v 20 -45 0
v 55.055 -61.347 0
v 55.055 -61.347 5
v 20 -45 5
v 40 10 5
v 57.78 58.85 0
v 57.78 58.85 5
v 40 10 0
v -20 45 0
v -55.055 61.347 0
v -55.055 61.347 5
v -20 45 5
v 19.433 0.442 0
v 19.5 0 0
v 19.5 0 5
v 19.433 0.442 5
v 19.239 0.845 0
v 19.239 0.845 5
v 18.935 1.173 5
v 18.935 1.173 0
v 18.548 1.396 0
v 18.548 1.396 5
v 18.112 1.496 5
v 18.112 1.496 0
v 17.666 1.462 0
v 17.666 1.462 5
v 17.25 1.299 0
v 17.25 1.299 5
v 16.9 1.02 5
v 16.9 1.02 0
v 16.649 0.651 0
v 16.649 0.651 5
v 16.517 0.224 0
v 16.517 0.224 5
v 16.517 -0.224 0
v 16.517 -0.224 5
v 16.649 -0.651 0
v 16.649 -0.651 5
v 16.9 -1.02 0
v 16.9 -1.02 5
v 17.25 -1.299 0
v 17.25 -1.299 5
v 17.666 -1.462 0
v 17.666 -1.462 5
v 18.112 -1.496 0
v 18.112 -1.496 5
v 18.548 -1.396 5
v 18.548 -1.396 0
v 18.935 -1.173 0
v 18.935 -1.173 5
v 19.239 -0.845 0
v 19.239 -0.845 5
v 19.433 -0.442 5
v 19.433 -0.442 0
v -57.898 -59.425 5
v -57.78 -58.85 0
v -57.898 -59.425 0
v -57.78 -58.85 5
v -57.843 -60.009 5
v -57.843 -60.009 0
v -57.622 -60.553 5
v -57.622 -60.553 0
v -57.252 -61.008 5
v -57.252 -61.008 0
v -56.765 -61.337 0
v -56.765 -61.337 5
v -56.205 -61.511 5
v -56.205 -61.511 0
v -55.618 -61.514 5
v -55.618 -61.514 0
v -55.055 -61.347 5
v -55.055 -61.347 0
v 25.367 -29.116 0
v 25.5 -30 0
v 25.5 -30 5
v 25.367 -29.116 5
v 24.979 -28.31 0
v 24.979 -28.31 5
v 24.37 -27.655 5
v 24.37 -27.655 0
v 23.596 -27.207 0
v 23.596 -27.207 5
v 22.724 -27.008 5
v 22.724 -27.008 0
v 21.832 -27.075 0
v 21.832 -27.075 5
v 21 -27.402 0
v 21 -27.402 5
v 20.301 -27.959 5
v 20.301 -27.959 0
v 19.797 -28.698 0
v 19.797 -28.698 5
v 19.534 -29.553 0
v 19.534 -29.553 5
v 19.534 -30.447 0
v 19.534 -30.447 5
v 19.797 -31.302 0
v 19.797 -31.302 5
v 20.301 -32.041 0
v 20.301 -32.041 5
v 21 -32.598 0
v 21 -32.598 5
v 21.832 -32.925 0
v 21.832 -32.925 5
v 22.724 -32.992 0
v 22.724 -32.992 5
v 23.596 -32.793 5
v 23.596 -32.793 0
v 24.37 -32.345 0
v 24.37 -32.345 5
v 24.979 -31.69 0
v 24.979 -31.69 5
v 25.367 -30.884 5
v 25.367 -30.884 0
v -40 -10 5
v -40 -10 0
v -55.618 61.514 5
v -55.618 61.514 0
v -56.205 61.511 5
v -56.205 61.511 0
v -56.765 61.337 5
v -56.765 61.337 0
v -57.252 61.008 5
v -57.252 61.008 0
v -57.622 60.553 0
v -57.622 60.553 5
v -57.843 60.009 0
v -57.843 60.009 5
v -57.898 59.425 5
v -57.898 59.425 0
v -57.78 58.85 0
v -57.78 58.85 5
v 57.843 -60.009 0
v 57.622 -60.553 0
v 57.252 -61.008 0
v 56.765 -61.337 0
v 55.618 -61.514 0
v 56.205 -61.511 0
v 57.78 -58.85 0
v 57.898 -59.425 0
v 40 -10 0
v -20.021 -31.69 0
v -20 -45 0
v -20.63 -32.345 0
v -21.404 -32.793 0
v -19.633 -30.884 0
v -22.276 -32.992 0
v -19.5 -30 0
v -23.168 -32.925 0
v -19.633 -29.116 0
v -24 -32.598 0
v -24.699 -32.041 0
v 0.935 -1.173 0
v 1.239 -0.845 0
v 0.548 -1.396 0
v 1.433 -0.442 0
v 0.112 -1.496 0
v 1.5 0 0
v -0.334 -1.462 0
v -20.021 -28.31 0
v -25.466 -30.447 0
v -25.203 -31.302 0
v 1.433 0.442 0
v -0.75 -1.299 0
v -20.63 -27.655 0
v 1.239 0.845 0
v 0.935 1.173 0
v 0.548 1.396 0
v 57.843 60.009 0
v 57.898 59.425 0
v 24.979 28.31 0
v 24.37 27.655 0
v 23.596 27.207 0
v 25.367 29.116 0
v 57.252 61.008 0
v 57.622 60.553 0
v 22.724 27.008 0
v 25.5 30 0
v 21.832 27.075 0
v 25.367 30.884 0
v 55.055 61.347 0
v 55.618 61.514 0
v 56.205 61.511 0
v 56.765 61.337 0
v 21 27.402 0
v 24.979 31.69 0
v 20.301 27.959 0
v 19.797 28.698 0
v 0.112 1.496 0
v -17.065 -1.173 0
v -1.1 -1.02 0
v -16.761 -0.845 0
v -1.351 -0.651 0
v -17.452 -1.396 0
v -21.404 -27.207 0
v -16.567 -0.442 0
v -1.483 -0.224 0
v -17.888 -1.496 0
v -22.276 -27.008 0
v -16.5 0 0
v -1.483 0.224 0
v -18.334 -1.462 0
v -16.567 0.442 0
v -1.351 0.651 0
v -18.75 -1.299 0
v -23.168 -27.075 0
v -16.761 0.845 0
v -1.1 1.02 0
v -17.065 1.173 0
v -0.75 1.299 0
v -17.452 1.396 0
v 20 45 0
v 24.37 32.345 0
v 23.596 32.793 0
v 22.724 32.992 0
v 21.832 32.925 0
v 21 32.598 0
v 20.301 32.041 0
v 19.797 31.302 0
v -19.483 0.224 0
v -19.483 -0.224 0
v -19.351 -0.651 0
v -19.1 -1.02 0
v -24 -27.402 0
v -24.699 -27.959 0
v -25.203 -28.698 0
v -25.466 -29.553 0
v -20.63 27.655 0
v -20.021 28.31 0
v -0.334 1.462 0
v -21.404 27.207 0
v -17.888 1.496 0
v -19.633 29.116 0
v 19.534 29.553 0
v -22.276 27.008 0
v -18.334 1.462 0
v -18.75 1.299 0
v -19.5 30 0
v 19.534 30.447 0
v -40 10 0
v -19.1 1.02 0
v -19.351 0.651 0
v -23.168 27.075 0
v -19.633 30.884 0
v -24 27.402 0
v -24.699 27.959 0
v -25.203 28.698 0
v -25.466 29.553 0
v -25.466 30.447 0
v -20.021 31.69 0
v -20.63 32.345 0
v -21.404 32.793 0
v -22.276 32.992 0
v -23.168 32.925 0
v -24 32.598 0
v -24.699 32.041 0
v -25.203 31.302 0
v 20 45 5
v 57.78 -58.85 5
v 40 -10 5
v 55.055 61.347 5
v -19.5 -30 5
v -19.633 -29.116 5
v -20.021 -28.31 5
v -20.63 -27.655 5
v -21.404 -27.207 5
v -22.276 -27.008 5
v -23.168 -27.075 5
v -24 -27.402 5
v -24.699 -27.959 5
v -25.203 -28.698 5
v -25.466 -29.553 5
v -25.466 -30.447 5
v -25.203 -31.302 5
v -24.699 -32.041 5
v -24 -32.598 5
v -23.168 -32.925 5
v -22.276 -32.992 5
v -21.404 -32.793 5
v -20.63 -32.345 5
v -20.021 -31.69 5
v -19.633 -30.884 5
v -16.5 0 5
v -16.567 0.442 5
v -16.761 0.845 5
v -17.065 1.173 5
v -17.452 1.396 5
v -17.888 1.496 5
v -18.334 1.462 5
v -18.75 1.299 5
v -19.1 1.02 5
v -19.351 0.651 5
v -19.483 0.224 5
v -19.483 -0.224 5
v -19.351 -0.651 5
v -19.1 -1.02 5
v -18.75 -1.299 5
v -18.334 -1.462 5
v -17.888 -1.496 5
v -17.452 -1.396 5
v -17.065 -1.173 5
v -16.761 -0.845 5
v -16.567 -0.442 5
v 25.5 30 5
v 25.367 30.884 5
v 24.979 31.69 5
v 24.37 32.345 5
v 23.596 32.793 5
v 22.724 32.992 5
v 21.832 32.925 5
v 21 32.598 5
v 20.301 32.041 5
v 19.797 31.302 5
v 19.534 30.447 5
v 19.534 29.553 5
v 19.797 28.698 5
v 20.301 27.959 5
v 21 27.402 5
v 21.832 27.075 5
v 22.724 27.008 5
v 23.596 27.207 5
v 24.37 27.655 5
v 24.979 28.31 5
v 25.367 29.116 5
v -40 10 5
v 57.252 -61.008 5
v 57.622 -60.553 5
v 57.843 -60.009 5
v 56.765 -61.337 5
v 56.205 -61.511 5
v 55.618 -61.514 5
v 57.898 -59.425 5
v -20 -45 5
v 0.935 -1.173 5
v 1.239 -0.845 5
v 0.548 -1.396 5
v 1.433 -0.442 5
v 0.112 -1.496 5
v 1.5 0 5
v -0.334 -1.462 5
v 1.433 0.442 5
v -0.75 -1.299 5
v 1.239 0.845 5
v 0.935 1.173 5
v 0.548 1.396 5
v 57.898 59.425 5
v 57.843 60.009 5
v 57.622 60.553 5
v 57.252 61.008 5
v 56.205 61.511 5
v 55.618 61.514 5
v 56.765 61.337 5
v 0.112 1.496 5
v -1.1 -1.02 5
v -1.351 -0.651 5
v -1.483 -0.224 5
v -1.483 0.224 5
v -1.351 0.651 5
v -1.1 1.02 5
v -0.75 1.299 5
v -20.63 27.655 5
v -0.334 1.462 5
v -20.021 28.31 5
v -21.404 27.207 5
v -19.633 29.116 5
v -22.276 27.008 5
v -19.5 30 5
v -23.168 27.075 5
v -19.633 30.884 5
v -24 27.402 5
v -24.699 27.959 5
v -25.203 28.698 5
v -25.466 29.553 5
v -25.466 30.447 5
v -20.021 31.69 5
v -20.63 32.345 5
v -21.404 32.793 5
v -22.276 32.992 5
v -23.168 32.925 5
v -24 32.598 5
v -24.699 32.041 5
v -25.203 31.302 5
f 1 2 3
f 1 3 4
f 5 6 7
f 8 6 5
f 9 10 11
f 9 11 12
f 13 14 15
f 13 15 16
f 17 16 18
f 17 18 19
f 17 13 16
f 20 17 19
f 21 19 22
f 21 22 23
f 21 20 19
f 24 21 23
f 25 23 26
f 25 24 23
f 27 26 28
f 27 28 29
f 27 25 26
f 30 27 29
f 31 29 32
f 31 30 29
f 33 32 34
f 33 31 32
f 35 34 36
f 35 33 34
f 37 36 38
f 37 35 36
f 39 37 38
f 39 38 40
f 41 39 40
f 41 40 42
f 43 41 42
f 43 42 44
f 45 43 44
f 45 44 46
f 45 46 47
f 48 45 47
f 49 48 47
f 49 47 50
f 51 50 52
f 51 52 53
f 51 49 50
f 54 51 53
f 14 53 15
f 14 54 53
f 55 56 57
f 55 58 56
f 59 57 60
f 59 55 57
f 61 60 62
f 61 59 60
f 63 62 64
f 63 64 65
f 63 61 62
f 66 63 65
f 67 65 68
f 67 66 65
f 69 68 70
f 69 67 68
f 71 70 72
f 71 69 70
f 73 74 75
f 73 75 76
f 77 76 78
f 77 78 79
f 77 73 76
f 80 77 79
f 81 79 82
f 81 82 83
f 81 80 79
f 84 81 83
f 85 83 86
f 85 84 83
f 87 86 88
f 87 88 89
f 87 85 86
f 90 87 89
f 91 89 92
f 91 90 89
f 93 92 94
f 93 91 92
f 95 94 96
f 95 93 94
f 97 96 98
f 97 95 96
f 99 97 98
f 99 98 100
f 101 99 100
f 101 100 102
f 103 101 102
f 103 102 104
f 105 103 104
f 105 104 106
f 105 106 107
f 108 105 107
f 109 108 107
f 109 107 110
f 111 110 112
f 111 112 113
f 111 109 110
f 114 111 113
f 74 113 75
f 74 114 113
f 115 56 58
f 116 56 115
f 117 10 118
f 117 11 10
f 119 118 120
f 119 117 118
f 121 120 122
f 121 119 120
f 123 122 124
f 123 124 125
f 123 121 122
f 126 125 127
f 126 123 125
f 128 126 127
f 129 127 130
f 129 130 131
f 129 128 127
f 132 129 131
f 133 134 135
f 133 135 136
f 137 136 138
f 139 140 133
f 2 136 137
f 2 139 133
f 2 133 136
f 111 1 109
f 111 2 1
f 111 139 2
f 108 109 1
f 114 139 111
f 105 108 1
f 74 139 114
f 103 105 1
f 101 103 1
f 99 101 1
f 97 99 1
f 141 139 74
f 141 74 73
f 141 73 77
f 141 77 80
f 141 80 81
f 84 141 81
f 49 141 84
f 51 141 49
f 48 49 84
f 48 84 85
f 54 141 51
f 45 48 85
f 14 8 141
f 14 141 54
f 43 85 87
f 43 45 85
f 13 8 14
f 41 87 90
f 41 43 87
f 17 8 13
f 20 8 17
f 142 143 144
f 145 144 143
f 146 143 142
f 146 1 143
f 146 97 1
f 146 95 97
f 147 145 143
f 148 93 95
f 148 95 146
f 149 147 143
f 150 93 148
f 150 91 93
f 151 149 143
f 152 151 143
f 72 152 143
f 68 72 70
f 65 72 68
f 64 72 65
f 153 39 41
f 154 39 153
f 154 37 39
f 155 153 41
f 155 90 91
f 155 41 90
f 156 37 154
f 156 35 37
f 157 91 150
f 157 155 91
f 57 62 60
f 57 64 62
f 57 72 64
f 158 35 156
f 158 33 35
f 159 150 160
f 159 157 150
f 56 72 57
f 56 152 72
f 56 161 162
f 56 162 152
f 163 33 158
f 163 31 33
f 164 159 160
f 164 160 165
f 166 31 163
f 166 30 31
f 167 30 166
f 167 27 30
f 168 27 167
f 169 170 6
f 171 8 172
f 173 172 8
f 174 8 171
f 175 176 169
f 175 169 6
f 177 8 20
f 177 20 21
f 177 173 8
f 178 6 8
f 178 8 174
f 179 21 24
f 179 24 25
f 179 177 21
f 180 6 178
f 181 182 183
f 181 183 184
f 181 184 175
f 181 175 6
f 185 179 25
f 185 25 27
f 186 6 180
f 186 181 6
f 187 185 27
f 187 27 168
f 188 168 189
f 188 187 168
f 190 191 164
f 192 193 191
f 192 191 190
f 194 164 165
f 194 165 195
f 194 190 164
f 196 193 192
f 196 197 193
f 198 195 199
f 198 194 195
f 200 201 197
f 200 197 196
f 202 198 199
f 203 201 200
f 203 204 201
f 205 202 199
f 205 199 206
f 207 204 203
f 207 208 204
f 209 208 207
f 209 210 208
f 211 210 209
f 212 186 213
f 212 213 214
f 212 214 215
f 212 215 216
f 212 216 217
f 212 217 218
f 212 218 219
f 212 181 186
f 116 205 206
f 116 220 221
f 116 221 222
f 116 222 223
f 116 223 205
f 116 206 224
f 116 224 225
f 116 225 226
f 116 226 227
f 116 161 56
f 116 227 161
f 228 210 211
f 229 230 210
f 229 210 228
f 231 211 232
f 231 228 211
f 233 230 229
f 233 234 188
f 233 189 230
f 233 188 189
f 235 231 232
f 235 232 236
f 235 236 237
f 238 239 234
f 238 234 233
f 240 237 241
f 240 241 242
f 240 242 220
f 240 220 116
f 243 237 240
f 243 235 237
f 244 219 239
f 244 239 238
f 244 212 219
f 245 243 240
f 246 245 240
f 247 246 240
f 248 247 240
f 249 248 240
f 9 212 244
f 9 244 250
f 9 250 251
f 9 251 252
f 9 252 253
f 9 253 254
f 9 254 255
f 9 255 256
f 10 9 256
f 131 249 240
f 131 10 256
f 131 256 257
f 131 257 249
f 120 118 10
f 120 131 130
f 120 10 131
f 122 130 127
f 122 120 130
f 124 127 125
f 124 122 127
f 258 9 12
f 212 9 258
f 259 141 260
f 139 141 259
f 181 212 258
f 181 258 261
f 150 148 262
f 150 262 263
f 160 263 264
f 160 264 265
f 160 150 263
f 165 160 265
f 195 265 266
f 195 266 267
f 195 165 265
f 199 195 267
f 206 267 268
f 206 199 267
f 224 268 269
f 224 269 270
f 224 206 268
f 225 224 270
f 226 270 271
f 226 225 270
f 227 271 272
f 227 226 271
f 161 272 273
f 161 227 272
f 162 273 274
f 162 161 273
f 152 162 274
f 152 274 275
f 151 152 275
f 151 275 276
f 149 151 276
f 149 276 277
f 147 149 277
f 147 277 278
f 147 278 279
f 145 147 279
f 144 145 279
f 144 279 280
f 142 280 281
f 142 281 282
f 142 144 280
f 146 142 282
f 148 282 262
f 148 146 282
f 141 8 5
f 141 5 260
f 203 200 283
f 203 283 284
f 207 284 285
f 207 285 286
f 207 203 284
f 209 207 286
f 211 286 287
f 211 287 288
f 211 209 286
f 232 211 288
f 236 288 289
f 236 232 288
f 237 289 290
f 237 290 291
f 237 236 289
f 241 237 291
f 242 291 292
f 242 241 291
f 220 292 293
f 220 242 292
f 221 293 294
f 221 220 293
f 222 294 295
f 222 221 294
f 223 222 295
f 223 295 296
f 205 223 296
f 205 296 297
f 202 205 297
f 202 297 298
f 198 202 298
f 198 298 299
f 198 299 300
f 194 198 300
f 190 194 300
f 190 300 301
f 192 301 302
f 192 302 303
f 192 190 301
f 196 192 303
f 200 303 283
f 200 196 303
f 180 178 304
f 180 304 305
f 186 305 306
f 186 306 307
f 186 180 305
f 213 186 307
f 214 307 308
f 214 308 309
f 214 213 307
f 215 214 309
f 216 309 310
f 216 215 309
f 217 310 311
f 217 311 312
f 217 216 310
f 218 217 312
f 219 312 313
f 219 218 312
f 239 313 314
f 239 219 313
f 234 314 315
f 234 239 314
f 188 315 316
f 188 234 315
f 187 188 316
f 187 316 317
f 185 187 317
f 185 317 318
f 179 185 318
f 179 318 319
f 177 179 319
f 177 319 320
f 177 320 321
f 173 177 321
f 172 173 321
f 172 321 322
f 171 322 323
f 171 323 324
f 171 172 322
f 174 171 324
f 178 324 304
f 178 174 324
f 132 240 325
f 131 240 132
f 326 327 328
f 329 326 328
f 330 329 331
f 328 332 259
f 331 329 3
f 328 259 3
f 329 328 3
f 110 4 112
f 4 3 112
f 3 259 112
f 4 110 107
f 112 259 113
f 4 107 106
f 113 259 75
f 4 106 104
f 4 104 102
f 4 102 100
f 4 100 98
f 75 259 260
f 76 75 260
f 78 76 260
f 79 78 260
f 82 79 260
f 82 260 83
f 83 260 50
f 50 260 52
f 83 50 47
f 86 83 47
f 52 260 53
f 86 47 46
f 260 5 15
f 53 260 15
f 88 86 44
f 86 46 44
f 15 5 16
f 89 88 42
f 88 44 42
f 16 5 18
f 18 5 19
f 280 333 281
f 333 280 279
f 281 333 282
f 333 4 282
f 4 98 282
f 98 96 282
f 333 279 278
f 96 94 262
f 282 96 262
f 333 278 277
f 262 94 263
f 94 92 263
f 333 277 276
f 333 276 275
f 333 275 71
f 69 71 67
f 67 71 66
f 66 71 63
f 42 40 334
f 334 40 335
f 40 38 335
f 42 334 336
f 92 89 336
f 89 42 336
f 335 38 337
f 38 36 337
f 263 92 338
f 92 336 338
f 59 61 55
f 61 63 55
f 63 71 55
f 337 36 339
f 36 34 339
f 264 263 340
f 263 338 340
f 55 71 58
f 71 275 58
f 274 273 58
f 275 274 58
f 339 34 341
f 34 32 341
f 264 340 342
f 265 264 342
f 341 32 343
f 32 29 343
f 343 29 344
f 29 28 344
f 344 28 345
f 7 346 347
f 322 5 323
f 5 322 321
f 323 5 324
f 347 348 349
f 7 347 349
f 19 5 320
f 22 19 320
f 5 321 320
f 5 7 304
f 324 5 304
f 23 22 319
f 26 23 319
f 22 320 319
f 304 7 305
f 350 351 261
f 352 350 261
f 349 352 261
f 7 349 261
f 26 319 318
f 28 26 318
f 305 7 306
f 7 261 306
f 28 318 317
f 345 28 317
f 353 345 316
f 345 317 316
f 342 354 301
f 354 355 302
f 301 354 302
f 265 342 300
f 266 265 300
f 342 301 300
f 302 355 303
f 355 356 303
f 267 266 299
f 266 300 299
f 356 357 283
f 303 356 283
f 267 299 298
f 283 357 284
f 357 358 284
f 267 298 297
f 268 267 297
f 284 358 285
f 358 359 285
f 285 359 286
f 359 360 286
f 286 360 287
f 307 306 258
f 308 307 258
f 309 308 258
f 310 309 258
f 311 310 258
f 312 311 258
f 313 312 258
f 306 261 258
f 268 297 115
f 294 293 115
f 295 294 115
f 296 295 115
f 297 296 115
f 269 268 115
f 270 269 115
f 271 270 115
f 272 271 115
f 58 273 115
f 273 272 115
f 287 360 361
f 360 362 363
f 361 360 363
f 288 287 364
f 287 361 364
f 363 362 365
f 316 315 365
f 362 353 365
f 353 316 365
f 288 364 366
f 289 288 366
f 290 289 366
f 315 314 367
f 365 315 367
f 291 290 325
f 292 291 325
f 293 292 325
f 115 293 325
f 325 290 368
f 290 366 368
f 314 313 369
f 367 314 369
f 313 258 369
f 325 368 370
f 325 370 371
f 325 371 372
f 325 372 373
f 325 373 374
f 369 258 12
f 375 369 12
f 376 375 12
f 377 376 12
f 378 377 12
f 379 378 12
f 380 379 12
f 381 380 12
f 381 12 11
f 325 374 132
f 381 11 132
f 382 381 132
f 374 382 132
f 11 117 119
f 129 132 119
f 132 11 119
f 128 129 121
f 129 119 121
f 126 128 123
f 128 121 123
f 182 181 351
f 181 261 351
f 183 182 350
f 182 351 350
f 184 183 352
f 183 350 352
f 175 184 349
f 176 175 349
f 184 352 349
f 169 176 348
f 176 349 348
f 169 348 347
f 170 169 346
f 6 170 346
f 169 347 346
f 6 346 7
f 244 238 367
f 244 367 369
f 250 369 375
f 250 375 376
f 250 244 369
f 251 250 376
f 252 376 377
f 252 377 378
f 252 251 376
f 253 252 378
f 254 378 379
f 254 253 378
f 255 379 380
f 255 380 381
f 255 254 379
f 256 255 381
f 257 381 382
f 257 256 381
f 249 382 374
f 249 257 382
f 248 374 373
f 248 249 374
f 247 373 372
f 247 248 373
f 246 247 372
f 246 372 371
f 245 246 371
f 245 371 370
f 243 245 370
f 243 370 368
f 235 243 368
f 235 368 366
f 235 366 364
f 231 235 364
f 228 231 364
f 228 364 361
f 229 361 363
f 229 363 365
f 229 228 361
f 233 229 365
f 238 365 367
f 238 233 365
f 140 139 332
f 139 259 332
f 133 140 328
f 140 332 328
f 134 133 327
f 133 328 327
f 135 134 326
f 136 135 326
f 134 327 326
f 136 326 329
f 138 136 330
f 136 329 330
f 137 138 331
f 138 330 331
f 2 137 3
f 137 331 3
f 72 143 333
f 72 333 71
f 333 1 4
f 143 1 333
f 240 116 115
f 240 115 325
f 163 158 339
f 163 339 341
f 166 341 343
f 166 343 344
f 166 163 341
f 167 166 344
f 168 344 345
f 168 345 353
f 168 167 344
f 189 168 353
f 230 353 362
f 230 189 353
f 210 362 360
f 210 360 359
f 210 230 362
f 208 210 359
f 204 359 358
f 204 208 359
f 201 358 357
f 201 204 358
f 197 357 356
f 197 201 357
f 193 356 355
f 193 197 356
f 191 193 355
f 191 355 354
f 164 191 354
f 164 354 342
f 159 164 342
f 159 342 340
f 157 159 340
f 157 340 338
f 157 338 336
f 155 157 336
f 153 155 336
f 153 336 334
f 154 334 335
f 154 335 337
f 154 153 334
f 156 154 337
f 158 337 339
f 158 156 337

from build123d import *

# Parameters (mm, degrees)
SKETCH1_R           = 3
SKETCH1_R_2         = 1.5
BOSS_EXTRUDE1_DEPTH = 5
FILLET1_R           = 2


with BuildPart() as part:
    # Sketch1 → Boss-Extrude1 (new body)
    with BuildSketch(Plane.XY):
        Polygon((-20, 45), (20, 45), (59.431325943, 63.387129258), (40, 10), (40, -10), (59.431325943, -63.387129258), (20, -45), (-20, -45), (-59.431325943, -63.387129258), (-40, -10), (-40, 10), (-59.431325943, 63.387129258), align=None)
        with Locations((-22.5, 30)):
            Circle(SKETCH1_R, mode=Mode.SUBTRACT)
        Circle(SKETCH1_R_2, mode=Mode.SUBTRACT)
        with Locations((-18, 0)):
            Circle(SKETCH1_R_2, mode=Mode.SUBTRACT)
        with Locations((18, 0)):
            Circle(SKETCH1_R_2, mode=Mode.SUBTRACT)
        with Locations((22.5, 30)):
            Circle(SKETCH1_R, mode=Mode.SUBTRACT)
        with Locations((22.5, -30)):
            Circle(SKETCH1_R, mode=Mode.SUBTRACT)
        with Locations((-22.5, -30)):
            Circle(SKETCH1_R, mode=Mode.SUBTRACT)
    extrude(amount=BOSS_EXTRUDE1_DEPTH)

    # Fillet1
    fillet1_edges = [part.edges().sort_by_distance(p)[0] for p in [
        (59.431325943, 63.387129258, 2.5),
        (59.431325943, -63.387129258, 2.5),
        (-59.431325943, -63.387129258, 2.5),
        (-59.431325943, 63.387129258, 2.5),
    ]]
    fillet(fillet1_edges, radius=FILLET1_R)


solid = part.part
